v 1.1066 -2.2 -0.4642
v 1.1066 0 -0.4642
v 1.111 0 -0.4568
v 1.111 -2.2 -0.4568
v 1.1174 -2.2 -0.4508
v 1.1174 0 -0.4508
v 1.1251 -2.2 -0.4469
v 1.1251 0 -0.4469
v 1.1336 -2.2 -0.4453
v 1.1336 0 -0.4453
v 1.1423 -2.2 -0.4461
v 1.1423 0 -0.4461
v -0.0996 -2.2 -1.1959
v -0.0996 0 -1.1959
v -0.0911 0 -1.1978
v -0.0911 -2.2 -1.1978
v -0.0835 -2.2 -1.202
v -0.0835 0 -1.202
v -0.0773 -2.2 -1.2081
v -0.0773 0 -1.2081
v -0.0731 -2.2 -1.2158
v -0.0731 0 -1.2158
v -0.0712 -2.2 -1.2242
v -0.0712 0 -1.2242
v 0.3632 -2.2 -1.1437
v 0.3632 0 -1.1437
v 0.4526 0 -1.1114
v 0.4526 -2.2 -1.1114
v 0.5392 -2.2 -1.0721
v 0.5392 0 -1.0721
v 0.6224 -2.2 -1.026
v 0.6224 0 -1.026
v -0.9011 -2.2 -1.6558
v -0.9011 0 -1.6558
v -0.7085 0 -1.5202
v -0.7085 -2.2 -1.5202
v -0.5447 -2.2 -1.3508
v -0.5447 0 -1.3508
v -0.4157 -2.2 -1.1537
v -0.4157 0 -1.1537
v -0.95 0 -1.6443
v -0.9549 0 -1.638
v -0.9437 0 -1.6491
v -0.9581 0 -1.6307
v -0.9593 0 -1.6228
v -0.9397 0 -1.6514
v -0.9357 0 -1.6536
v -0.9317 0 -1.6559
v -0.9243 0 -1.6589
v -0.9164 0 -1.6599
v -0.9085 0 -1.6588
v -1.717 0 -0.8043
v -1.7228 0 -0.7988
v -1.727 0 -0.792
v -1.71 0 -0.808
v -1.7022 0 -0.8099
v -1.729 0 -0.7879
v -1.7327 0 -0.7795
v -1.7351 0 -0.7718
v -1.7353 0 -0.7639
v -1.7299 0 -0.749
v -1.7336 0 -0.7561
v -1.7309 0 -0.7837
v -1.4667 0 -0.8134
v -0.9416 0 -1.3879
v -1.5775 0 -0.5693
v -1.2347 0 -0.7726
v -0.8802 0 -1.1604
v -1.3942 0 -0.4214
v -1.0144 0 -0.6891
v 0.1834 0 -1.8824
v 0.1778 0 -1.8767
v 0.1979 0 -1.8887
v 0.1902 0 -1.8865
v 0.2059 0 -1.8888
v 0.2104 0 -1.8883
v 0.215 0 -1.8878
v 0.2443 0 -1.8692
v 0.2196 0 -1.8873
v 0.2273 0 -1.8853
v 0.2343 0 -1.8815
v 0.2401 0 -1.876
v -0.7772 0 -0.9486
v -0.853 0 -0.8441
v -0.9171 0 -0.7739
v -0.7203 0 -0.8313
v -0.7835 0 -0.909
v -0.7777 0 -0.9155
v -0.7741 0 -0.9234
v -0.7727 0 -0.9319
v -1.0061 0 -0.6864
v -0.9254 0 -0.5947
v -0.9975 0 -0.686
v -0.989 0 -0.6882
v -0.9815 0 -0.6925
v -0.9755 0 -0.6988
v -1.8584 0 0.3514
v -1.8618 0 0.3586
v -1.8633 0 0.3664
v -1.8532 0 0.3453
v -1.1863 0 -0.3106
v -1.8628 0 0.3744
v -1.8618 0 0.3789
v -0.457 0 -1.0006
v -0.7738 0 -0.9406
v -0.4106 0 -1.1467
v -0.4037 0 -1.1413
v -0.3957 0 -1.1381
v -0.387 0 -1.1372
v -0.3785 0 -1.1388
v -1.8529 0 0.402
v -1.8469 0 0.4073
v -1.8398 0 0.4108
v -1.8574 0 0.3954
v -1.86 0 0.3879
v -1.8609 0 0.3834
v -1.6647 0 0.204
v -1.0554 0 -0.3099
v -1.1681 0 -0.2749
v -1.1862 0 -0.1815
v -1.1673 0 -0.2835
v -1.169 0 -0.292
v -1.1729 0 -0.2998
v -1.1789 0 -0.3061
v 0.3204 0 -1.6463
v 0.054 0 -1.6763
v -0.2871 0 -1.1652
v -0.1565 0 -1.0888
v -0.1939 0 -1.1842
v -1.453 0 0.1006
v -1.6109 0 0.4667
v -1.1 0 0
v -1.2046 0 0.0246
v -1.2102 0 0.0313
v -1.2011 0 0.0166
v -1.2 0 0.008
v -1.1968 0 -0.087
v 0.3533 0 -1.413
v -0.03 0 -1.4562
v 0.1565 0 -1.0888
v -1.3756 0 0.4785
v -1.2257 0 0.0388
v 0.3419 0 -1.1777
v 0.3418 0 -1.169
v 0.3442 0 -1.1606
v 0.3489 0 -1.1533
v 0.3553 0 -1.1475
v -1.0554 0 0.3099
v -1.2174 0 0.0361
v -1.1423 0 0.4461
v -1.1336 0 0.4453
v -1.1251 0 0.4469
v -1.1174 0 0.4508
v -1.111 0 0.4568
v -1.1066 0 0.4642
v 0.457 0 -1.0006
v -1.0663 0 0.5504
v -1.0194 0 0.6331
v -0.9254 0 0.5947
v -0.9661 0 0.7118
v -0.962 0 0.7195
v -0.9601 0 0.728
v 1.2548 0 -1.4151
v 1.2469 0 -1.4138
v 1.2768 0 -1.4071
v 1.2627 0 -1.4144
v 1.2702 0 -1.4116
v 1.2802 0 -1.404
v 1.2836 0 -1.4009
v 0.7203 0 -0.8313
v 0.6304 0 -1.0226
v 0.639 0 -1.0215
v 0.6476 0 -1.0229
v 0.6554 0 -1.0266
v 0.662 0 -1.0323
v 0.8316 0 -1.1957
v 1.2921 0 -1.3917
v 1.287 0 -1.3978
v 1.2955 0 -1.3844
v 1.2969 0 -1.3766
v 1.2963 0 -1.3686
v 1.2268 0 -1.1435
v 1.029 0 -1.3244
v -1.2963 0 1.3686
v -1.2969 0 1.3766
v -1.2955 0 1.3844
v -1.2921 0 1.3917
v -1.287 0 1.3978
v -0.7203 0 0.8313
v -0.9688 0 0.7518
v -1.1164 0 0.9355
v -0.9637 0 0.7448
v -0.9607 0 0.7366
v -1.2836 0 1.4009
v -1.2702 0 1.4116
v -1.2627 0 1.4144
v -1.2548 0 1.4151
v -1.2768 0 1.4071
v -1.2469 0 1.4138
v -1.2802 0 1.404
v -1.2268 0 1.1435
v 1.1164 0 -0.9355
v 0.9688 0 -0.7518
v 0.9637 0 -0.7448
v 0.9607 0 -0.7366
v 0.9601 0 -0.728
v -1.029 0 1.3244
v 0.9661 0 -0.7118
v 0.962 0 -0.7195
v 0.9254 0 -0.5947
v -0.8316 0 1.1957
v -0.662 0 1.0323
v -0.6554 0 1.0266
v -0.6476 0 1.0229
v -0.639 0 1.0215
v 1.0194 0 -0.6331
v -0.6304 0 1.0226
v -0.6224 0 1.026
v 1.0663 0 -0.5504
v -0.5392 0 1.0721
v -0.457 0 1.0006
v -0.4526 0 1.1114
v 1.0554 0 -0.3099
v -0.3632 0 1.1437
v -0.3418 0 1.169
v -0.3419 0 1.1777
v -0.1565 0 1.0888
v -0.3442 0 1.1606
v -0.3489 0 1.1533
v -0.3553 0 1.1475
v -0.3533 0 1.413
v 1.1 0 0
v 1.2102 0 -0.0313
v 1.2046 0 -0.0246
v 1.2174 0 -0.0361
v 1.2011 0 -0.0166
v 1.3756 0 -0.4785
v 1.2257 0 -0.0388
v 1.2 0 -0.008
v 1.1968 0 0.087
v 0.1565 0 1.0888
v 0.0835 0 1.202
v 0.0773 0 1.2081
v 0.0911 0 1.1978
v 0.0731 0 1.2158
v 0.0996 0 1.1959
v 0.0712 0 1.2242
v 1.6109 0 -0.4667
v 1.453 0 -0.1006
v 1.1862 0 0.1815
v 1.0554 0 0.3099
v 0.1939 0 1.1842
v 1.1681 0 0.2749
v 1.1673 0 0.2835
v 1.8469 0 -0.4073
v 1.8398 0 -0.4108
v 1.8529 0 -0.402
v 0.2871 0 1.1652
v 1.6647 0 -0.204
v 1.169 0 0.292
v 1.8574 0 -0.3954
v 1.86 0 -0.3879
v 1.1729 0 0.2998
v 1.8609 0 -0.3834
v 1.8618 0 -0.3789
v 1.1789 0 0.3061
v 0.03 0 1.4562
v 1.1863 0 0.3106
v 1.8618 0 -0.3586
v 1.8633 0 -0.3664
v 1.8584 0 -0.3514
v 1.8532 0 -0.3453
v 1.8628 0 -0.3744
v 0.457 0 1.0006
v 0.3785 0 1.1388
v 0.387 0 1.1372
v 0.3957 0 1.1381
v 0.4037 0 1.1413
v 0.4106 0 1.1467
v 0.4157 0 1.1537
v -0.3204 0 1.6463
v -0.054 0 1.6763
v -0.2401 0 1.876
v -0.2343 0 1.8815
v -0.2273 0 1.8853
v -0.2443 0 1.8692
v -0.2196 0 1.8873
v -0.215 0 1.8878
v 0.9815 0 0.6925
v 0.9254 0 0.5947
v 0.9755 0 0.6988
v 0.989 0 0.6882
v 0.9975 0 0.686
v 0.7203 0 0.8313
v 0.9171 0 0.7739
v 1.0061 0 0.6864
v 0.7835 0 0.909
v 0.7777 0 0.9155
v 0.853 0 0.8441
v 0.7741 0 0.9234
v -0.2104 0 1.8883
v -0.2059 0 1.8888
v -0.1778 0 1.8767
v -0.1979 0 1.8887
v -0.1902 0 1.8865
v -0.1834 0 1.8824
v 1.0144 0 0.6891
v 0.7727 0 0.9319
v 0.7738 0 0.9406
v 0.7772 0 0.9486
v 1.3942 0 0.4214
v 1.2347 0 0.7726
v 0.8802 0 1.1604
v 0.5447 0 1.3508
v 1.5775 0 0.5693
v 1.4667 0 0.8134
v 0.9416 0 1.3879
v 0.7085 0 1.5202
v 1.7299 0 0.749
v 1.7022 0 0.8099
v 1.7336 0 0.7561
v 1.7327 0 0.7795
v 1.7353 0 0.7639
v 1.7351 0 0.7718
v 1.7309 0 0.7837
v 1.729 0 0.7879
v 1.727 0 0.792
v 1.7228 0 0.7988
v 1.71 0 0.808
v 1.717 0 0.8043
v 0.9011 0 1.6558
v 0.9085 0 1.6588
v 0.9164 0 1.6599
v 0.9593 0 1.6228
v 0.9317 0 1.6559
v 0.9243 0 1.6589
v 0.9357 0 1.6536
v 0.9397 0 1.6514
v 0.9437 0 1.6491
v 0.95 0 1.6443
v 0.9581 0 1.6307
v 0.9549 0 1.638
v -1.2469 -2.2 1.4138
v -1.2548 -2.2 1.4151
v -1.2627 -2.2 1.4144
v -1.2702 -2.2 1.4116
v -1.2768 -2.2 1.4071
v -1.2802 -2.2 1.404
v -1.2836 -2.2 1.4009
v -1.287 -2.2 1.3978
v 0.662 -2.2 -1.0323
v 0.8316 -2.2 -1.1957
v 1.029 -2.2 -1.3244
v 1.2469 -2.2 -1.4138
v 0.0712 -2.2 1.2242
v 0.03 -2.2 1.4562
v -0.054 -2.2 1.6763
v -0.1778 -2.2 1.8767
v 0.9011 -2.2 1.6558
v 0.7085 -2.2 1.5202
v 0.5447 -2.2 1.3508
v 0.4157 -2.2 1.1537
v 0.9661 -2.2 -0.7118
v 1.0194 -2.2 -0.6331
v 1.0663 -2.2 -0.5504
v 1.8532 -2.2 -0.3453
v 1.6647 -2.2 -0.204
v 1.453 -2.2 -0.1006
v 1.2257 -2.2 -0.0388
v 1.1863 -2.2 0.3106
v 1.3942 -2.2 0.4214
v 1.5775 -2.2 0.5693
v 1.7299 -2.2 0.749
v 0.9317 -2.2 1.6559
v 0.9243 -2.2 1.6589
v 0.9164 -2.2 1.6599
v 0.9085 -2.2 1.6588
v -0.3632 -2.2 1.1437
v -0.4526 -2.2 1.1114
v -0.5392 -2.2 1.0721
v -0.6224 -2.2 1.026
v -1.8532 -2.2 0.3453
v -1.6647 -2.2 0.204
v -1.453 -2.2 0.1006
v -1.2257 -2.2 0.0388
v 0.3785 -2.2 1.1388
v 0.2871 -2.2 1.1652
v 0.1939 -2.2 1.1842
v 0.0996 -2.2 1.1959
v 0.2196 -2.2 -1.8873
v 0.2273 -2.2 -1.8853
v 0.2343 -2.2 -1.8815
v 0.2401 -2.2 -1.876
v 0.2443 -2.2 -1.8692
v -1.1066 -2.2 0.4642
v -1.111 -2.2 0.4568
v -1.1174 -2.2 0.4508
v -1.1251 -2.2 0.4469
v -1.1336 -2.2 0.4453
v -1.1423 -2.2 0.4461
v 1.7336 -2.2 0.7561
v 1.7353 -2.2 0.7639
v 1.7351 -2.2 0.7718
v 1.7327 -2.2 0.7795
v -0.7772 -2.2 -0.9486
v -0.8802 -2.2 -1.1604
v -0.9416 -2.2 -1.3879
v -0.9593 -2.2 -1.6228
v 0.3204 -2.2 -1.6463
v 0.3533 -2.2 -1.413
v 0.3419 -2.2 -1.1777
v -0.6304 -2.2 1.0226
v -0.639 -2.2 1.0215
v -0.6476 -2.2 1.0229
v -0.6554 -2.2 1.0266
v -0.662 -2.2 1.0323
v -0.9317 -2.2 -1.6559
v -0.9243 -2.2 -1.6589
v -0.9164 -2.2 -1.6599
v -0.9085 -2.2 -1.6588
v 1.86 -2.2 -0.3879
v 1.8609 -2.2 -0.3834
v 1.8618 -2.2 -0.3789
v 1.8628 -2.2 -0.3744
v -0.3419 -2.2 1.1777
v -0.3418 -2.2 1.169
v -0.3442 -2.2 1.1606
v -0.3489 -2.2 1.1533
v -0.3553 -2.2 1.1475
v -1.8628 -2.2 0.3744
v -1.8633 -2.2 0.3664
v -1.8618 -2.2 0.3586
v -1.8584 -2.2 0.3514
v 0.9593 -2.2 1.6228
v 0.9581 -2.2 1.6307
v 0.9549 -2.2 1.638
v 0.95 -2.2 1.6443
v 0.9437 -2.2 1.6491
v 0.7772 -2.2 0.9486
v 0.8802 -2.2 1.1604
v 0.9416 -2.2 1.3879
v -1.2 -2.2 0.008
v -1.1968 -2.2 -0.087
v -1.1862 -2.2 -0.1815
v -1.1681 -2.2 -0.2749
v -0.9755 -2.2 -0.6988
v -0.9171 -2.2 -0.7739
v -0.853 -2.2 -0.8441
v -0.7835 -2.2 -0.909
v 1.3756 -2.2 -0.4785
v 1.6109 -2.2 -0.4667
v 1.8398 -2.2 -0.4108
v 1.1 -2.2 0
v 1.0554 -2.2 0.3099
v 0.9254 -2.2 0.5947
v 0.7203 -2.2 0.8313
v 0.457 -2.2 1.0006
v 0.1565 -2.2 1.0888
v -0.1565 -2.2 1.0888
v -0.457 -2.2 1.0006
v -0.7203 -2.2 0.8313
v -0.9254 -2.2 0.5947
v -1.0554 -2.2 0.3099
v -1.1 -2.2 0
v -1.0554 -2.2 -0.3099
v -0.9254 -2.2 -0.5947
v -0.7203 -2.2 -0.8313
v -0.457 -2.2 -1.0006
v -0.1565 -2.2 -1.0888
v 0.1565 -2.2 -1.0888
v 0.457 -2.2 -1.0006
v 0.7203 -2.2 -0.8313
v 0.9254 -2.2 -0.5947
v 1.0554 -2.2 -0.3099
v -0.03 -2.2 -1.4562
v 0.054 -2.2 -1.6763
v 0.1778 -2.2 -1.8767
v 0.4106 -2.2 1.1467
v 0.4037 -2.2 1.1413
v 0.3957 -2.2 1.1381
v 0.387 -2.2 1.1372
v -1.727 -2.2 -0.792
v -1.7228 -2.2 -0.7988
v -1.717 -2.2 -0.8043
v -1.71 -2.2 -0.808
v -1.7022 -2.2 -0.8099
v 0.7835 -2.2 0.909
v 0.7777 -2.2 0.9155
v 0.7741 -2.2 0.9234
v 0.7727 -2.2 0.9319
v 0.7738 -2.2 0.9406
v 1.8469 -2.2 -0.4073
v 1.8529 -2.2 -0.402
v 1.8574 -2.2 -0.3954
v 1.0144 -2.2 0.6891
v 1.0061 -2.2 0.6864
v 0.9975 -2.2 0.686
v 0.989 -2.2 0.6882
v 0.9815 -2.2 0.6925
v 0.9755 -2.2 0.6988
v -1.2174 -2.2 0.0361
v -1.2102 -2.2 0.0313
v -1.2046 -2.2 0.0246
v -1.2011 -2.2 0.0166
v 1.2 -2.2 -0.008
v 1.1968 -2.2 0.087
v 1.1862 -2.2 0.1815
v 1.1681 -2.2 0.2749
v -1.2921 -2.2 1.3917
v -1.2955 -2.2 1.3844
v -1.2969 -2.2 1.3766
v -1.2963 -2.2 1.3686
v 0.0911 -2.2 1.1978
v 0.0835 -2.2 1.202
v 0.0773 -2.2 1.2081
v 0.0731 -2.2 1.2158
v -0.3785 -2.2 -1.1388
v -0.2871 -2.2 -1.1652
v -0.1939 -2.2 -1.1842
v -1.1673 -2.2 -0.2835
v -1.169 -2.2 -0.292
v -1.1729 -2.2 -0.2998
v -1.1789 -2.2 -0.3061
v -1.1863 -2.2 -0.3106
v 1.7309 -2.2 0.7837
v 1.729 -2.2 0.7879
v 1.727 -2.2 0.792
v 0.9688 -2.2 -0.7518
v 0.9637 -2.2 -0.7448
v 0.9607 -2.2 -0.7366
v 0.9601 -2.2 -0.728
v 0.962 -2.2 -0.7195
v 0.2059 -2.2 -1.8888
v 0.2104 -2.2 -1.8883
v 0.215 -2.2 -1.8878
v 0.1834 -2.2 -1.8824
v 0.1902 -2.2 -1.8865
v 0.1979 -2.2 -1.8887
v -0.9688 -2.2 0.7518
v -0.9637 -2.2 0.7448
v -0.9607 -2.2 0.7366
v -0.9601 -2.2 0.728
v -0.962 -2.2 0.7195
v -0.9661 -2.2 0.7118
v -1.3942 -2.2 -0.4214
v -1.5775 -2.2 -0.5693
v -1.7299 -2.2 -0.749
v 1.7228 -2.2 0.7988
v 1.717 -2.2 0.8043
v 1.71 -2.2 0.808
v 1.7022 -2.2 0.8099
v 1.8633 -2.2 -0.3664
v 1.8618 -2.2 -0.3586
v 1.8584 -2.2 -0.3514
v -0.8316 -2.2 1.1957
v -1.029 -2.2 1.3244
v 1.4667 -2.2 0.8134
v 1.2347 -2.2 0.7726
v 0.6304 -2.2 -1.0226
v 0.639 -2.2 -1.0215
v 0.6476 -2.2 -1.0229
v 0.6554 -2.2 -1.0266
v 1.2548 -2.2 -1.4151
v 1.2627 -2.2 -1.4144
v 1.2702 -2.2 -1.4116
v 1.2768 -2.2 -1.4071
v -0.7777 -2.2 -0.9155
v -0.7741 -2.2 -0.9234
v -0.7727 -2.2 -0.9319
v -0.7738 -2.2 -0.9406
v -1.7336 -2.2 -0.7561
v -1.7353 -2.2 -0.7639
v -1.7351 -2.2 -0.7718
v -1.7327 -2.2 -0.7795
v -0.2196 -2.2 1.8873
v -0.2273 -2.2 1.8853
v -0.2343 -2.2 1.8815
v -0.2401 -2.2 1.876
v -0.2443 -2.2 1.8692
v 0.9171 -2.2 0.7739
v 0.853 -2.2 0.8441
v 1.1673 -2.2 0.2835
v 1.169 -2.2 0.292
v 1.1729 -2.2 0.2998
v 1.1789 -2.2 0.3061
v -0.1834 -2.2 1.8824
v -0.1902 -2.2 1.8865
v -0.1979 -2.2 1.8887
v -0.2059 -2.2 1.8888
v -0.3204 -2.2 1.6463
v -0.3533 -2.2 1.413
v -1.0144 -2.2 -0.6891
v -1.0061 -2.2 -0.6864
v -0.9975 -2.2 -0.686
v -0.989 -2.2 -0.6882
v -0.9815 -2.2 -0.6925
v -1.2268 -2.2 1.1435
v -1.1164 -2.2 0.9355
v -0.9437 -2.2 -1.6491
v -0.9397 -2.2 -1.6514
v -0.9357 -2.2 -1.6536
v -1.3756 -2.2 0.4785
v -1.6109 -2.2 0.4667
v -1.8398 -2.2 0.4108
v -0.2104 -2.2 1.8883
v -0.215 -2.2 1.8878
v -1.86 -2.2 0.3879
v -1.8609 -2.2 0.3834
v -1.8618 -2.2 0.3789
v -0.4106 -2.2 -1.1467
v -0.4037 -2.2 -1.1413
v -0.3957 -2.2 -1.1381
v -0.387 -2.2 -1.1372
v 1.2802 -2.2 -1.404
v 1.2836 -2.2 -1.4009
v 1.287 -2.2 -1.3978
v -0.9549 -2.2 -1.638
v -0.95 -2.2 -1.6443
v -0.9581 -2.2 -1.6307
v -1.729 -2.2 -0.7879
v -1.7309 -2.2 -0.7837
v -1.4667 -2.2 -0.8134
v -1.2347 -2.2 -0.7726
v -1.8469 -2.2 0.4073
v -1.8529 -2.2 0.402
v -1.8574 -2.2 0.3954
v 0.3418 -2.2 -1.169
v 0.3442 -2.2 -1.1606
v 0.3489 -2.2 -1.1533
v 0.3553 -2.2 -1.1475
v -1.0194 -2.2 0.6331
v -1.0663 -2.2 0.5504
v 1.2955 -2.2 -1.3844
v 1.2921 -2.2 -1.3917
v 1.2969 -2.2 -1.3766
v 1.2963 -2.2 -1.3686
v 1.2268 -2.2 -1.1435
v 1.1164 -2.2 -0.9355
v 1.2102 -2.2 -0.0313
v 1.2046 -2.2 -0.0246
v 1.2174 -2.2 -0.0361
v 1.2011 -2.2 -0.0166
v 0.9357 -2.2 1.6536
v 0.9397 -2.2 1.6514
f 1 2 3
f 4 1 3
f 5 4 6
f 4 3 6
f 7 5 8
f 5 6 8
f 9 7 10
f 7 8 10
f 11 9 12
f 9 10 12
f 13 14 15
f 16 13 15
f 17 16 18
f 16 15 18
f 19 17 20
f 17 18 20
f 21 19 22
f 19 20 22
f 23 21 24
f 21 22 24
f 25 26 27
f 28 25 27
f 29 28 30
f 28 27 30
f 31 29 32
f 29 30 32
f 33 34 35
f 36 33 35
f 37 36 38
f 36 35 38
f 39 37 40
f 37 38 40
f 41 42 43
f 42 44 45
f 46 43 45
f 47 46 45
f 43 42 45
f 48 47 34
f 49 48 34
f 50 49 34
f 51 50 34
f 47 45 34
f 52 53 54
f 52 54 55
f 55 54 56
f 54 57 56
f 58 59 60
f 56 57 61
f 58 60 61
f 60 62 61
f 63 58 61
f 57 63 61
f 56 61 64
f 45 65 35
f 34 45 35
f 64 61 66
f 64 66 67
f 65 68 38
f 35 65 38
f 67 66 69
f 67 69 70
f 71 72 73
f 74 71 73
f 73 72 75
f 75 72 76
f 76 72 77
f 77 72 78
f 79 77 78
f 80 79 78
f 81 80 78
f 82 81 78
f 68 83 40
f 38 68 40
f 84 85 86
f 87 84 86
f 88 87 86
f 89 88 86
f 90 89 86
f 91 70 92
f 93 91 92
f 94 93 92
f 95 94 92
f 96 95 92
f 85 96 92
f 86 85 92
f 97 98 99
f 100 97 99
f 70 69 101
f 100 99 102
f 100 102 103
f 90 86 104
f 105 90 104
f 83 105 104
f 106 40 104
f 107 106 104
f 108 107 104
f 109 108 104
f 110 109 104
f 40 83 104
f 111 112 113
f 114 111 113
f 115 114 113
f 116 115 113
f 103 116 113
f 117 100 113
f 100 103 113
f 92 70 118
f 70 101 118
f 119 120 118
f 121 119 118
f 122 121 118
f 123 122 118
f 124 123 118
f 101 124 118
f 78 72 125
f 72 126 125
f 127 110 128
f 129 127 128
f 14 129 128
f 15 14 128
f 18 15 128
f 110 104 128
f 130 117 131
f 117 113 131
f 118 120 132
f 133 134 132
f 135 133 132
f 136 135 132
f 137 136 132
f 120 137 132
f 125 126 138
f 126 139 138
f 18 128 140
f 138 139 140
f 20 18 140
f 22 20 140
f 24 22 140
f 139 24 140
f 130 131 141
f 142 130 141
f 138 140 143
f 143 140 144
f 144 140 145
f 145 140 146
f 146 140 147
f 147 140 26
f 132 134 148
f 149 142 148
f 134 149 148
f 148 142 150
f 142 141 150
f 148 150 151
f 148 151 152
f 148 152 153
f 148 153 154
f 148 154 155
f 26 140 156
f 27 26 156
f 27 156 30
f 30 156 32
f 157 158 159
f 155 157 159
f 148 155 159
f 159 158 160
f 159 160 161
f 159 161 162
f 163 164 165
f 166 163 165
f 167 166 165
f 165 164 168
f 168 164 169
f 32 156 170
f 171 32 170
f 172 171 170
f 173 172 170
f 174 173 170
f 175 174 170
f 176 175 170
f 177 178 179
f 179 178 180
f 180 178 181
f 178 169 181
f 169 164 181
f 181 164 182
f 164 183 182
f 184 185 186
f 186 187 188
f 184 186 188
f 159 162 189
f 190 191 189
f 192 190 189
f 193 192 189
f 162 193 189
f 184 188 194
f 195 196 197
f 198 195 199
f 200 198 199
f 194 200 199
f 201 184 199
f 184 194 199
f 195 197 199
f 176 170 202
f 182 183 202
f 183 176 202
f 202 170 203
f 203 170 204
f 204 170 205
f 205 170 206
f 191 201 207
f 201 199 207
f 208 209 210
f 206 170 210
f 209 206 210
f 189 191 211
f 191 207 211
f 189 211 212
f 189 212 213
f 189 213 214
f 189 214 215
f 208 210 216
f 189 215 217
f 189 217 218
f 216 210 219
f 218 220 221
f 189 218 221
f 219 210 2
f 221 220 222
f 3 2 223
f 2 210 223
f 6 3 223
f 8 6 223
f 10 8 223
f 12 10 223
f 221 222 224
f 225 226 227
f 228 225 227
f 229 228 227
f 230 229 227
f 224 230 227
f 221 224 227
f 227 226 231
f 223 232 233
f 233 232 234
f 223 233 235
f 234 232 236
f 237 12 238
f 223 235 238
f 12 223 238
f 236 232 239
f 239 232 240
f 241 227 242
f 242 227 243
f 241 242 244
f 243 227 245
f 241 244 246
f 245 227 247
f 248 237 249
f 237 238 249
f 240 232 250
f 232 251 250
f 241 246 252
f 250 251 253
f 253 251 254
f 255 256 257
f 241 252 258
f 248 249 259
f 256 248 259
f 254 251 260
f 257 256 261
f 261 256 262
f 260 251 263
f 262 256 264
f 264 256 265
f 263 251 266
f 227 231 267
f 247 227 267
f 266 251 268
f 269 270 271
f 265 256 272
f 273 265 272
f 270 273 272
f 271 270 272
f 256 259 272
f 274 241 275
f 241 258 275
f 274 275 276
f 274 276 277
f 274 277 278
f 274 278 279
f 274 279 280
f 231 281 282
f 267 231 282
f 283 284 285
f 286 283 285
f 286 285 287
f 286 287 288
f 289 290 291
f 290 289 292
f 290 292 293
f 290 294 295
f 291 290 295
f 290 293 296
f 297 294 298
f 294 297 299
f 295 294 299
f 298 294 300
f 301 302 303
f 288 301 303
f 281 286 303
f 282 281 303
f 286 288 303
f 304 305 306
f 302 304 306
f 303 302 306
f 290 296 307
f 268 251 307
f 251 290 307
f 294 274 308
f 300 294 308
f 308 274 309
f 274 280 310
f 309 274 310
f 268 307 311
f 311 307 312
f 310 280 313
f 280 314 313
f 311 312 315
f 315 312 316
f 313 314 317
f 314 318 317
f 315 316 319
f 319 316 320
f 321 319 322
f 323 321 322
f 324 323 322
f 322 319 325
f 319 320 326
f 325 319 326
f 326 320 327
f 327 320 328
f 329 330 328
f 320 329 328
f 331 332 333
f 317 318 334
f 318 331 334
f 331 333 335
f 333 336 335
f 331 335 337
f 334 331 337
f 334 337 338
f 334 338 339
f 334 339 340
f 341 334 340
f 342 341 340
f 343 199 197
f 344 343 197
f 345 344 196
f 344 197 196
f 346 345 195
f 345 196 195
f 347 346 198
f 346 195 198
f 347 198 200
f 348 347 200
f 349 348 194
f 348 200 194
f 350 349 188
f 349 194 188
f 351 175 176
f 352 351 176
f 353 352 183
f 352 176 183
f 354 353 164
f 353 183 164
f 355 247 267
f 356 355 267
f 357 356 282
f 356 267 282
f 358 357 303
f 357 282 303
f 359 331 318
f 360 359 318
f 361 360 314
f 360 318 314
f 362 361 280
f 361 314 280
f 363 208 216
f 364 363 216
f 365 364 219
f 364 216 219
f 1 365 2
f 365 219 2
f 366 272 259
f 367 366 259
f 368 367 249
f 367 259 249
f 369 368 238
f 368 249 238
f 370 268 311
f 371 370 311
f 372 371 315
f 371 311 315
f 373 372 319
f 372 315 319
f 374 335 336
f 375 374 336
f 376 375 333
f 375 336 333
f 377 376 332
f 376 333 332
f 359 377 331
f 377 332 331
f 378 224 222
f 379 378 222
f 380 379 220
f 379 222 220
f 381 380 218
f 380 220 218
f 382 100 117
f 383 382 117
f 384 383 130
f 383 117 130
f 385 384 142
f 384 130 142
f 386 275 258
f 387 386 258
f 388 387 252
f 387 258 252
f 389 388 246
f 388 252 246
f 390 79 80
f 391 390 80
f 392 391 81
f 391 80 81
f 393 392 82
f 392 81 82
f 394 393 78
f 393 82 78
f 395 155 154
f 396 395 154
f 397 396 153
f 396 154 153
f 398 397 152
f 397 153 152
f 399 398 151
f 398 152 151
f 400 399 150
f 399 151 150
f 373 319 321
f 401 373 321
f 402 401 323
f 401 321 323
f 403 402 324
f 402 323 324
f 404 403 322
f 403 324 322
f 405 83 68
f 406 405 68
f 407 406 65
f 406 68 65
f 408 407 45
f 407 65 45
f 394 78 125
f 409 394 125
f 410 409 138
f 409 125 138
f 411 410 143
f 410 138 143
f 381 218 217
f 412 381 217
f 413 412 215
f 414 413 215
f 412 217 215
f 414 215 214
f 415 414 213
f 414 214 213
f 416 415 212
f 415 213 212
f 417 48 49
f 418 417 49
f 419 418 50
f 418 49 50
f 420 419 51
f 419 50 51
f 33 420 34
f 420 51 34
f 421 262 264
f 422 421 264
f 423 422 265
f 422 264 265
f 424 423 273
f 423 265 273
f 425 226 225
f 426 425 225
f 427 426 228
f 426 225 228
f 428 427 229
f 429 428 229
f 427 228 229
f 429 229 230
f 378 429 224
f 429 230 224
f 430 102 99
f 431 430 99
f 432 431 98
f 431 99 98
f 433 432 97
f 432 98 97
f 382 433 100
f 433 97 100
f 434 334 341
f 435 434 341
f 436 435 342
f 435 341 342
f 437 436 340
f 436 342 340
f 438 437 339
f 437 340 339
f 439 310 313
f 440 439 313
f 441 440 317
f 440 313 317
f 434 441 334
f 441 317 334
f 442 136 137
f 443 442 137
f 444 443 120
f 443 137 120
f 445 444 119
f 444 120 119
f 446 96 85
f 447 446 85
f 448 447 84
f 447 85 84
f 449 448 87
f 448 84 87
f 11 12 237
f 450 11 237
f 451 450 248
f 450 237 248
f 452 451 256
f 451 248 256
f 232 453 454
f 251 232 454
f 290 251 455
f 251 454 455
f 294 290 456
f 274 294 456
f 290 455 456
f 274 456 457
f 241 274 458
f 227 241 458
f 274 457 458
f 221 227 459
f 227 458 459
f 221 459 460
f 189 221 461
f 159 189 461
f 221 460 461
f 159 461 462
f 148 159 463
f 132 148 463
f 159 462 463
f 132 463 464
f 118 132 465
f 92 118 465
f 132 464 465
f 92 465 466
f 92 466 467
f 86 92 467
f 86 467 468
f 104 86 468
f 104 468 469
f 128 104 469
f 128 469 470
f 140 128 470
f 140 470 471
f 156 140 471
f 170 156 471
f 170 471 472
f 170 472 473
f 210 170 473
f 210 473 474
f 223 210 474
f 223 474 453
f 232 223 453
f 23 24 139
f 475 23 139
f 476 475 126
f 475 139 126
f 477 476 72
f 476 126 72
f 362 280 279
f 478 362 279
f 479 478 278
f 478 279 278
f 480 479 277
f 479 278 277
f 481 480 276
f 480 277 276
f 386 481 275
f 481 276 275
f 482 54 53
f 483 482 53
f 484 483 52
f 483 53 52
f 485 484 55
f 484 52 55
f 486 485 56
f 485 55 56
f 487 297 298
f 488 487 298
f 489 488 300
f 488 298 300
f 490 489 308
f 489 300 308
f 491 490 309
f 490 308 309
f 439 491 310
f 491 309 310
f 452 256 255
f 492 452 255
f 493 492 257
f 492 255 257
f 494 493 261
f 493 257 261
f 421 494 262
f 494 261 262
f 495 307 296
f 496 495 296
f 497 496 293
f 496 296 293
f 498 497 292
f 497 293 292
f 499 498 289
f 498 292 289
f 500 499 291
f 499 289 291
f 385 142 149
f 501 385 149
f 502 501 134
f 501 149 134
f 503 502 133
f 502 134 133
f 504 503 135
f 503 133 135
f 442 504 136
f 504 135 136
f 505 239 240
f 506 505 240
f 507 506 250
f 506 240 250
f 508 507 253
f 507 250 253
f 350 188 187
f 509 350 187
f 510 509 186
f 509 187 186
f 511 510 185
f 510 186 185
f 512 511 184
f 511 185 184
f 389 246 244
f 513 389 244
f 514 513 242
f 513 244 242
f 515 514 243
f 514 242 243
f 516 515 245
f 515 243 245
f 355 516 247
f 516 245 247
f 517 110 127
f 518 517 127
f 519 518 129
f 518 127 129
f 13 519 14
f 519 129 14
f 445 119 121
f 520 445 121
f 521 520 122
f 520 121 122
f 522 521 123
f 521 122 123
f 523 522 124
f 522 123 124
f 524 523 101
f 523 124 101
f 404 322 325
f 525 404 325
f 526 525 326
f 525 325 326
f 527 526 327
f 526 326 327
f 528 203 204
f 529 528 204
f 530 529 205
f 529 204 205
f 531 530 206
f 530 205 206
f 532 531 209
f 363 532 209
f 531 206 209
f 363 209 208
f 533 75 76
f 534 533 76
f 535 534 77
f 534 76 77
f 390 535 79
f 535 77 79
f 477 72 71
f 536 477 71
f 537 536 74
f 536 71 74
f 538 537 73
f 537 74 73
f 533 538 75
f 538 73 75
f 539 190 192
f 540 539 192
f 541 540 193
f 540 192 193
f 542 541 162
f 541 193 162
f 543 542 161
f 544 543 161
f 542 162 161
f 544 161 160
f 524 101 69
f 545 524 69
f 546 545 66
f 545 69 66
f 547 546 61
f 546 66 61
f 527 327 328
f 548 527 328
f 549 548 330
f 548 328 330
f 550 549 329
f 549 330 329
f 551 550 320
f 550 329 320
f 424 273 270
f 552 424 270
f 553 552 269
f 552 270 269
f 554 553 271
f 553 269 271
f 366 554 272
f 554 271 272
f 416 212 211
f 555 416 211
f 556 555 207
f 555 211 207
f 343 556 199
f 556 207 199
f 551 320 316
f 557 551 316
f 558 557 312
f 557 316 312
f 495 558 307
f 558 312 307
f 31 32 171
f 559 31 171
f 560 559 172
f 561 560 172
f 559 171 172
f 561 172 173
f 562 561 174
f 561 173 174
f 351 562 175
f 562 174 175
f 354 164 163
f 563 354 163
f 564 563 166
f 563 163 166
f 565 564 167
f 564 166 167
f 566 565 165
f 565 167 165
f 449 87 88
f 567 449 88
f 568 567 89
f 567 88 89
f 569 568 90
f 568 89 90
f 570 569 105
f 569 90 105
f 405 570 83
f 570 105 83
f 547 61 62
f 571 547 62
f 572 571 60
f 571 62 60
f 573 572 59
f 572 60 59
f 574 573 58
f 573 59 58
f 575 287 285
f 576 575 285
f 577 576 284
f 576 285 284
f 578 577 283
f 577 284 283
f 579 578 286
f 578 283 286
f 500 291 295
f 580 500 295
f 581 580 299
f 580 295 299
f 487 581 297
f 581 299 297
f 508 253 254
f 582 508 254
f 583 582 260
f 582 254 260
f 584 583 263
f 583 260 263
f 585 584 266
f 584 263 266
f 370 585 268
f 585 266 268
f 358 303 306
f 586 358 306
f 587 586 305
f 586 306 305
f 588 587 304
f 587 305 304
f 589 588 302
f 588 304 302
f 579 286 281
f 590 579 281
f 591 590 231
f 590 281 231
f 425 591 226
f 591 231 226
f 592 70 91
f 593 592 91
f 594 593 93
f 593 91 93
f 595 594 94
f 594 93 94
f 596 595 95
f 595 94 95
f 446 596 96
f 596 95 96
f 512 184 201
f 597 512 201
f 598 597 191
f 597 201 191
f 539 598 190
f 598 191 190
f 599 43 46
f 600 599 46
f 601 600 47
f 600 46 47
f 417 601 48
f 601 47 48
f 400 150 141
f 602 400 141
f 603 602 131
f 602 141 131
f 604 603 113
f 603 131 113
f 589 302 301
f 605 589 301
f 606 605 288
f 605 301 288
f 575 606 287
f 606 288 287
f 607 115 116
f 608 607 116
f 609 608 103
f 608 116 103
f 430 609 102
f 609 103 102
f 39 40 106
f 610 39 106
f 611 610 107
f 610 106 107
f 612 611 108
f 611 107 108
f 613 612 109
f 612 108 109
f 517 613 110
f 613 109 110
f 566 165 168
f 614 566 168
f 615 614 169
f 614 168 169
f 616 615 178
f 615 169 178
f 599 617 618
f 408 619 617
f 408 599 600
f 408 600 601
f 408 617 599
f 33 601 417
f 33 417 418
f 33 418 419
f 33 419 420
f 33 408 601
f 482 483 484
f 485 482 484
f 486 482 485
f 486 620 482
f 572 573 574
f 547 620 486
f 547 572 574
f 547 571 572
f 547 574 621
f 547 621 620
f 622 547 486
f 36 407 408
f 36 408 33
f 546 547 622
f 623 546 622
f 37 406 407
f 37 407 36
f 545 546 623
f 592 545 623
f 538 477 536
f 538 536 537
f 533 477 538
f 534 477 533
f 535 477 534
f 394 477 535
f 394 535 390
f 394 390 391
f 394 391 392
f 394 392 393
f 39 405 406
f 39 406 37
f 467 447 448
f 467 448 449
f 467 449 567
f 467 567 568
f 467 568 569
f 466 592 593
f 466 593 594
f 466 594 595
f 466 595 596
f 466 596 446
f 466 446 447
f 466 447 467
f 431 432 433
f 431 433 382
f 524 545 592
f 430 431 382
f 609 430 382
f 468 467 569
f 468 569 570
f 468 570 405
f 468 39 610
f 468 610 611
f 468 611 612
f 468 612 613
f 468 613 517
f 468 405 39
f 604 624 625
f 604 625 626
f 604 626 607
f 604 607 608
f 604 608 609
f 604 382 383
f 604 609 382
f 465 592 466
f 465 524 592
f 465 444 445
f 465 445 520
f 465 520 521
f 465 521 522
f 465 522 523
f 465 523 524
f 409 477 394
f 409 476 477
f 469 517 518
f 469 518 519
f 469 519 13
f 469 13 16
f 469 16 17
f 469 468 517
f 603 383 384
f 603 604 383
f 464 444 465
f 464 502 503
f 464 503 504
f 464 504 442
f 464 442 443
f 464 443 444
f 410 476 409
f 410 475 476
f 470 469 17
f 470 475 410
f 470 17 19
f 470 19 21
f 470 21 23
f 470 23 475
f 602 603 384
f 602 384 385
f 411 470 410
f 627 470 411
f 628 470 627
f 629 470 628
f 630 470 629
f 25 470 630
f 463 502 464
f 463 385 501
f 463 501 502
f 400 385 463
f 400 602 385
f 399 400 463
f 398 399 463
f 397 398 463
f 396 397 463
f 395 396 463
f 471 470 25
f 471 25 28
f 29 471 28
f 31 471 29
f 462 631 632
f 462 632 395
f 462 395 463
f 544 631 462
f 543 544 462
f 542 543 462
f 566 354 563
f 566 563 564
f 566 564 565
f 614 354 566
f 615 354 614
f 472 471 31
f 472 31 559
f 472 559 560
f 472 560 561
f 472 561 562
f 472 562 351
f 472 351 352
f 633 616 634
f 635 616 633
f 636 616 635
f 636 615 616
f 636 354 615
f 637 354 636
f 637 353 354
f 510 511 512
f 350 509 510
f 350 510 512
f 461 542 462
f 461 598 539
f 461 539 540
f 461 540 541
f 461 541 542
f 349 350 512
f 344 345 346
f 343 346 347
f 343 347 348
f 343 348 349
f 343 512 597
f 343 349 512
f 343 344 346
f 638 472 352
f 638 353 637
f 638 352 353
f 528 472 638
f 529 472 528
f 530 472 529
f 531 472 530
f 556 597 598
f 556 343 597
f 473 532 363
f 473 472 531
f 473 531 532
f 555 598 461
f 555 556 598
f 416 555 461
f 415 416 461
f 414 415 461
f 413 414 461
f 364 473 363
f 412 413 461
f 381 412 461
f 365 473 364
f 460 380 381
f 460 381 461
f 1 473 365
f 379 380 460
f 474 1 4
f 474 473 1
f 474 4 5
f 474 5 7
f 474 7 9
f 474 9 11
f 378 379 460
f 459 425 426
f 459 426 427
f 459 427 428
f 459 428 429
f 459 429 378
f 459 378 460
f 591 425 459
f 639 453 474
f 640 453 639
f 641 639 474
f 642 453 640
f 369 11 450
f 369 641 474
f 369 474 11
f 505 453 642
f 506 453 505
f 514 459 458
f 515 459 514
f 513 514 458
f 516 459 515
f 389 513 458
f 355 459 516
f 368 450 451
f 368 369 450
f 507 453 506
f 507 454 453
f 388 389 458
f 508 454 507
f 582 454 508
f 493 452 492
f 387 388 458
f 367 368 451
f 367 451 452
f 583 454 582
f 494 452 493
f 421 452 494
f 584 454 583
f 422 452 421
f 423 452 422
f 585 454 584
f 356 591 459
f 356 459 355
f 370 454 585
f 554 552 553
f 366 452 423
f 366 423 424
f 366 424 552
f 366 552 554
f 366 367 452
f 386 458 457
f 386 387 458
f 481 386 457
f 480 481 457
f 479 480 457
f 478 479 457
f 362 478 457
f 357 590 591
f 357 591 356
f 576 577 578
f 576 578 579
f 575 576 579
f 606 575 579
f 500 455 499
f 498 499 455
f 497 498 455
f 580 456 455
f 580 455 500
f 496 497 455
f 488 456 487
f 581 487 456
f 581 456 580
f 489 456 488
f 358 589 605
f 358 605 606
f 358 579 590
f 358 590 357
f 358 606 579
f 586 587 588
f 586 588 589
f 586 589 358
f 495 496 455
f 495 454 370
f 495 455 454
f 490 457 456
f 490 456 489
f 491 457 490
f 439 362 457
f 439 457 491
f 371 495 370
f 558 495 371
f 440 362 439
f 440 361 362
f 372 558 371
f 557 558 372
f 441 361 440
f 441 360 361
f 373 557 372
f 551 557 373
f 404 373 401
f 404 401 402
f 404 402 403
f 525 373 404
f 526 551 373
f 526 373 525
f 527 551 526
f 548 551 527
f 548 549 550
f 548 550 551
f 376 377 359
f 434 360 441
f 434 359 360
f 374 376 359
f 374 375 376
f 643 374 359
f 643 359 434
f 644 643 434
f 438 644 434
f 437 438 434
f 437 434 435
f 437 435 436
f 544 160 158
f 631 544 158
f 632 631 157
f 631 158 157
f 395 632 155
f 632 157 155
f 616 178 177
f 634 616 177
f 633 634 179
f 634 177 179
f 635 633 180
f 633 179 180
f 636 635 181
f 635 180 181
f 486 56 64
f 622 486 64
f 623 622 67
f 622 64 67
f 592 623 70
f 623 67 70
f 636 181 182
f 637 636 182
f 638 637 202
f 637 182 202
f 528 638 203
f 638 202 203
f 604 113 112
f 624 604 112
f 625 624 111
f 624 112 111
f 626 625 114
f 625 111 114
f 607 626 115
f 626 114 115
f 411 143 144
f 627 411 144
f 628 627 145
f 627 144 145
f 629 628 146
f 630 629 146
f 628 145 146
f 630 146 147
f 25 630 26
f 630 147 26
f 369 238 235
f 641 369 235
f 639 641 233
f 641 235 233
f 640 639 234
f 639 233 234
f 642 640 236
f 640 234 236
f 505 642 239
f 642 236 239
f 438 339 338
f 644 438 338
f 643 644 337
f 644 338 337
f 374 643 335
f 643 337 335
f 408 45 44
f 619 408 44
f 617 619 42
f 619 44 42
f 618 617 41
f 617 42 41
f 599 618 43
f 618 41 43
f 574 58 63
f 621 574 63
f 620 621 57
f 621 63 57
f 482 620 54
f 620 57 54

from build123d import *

# Parameters (mm, degrees)
F1_DEPTH = 2.2
F2_R     = 1.1
F3_DEPTH = 2.201


# Not quite as in the source:
# - a feature names something its author has since deleted; it is built from what else it names


with BuildPart() as f1:
    # F0 (on Front) → F1 (new body)
    with BuildSketch(Plane.XZ):
        with BuildLine():
            ThreePointArc((0.0712355079, 1.2242322703), (-0.0067892224, 1.5682114478), (-0.1777987566, 1.8767001385))
            ThreePointArc((-0.1777987566, 1.8767001385), (-0.1902412648, 1.886460015), (-0.2058788954, 1.888812823))
            ThreePointArc((-0.2058788954, 1.888812823), (-0.2127325046, 1.8880531988), (-0.2195833118, 1.8872687061))
            ThreePointArc((-0.2195833118, 1.8872687061), (-0.2343053253, 1.8814951877), (-0.244264097, 1.8692112932))
            ThreePointArc((-0.244264097, 1.8692112932), (-0.3423408736, 1.5304038568), (-0.3418667931, 1.1776868196))
            ThreePointArc((-0.3418667931, 1.1776868196), (-0.3462894397, 1.1567994489), (-0.3631689361, 1.1437256331))
            ThreePointArc((-0.3631689361, 1.1437256331), (-0.496270206, 1.092573056), (-0.6223642321, 1.025993549))
            ThreePointArc((-0.6223642321, 1.025993549), (-0.8096046551, 0.885742797), (-0.966074901, 0.7118281293))
            ThreePointArc((-0.966074901, 0.7118281293), (-1.0436893598, 0.5922098617), (-1.1065671175, 0.4642297001))
            ThreePointArc((-1.1065671175, 0.4642297001), (-1.1756104781, 0.2407072989), (-1.1999730893, 0.0080364743))
            ThreePointArc((-1.1999730893, 0.0080364743), (-1.1924546519, -0.1343573713), (-1.1680989749, -0.2748541157))
            ThreePointArc((-1.1680989749, -0.2748541157), (-1.092573056, -0.496270206), (-0.9755223431, -0.6988248408))
            ThreePointArc((-0.9755223431, -0.6988248408), (-0.885742797, -0.8096046551), (-0.7834567261, -0.9089530012))
            ThreePointArc((-0.7834567261, -0.9089530012), (-0.5922098617, -1.0436893598), (-0.3784552187, -1.1387588188))
            ThreePointArc((-0.3784552187, -1.1387588188), (-0.2407072989, -1.1756104781), (-0.0995606366, -1.1958627344))
            ThreePointArc((-0.0995606366, -1.1958627344), (0.1343573713, -1.1924546519), (0.3631689361, -1.1437256331))
            ThreePointArc((0.3631689361, -1.1437256331), (0.496270206, -1.092573056), (0.6223642321, -1.025993549))
            ThreePointArc((0.6223642321, -1.025993549), (0.8096046551, -0.885742797), (0.966074901, -0.7118281293))
            ThreePointArc((0.966074901, -0.7118281293), (1.0436893598, -0.5922098617), (1.1065671175, -0.4642297001))
            ThreePointArc((1.1065671175, -0.4642297001), (1.1756104781, -0.2407072989), (1.1999730893, -0.0080364743))
            ThreePointArc((1.1999730893, -0.0080364743), (1.1924546519, 0.1343573713), (1.1680989749, 0.2748541157))
            ThreePointArc((1.1680989749, 0.2748541157), (1.092573056, 0.496270206), (0.9755223431, 0.6988248408))
            ThreePointArc((0.9755223431, 0.6988248408), (0.885742797, 0.8096046551), (0.7834567261, 0.9089530012))
            ThreePointArc((0.7834567261, 0.9089530012), (0.5922098617, 1.0436893598), (0.3784552187, 1.1387588188))
            ThreePointArc((0.3784552187, 1.1387588188), (0.2407072989, 1.1756104781), (0.0995606366, 1.1958627344))
            ThreePointArc((0.0995606366, 1.1958627344), (0.0801951467, 1.2048527211), (0.0712355079, 1.2242322703))
        make_face()
        with BuildLine():
            ThreePointArc((-0.966074901, 0.7118281293), (-0.8096046551, 0.885742797), (-0.6223642321, 1.025993549))
            ThreePointArc((-0.6223642321, 1.025993549), (-0.6433154241, 1.0218838516), (-0.6619549374, 1.0322958927))
            ThreePointArc((-0.6619549374, 1.0322958927), (-0.9272641578, 1.2647191073), (-1.2469388801, 1.4137748184))
            ThreePointArc((-1.2469388801, 1.4137748184), (-1.262741792, 1.4143572015), (-1.2767758469, 1.4070690946))
            ThreePointArc((-1.2767758469, 1.4070690946), (-1.2818740373, 1.4024260952), (-1.2869553435, 1.3977646239))
            ThreePointArc((-1.2869553435, 1.3977646239), (-1.2954721137, 1.3844403669), (-1.2963086372, 1.3686488684))
            ThreePointArc((-1.2963086372, 1.3686488684), (-1.1765084017, 1.0368998116), (-0.9688029898, 0.7518243919))
            ThreePointArc((-0.9688029898, 0.7518243919), (-0.9601036976, 0.7323265875), (-0.966074901, 0.7118281293))
        make_face()
        with BuildLine():
            ThreePointArc((-0.9755223431, -0.6988248408), (-1.092573056, -0.496270206), (-1.1680989749, -0.2748541157))
            ThreePointArc((-1.1680989749, -0.2748541157), (-1.1706646948, -0.2960498497), (-1.1863270607, -0.3105595826))
            ThreePointArc((-1.1863270607, -0.3105595826), (-1.4893597313, -0.4910609223), (-1.7299050585, -0.7490289022))
            ThreePointArc((-1.7299050585, -0.7490289022), (-1.7353423061, -0.7638783983), (-1.7327476659, -0.7794777265))
            ThreePointArc((-1.7327476659, -0.7794777265), (-1.7299073387, -0.7857611594), (-1.7270442259, -0.7920342427))
            ThreePointArc((-1.7270442259, -0.7920342427), (-1.7170039312, -0.8042515943), (-1.7022438237, -0.8099270169))
            ThreePointArc((-1.7022438237, -0.8099270169), (-1.3497114128, -0.7985063187), (-1.0144040751, -0.6890598826))
            ThreePointArc((-1.0144040751, -0.6890598826), (-0.9931723321, -0.686811517), (-0.9755223431, -0.6988248408))
        make_face()
        with BuildLine():
            ThreePointArc((0.3418667931, -1.1776868196), (0.3462894397, -1.1567994489), (0.3631689361, -1.1437256331))
            ThreePointArc((0.3631689361, -1.1437256331), (0.1343573713, -1.1924546519), (-0.0995606366, -1.1958627344))
            ThreePointArc((-0.0995606366, -1.1958627344), (-0.0801951467, -1.2048527211), (-0.0712355079, -1.2242322703))
            ThreePointArc((-0.0712355079, -1.2242322703), (0.0067892224, -1.5682114478), (0.1777987566, -1.8767001385))
            ThreePointArc((0.1777987566, -1.8767001385), (0.1902412648, -1.886460015), (0.2058788954, -1.888812823))
            ThreePointArc((0.2058788954, -1.888812823), (0.2127325046, -1.8880531988), (0.2195833118, -1.8872687061))
            ThreePointArc((0.2195833118, -1.8872687061), (0.2343053253, -1.8814951877), (0.244264097, -1.8692112932))
            ThreePointArc((0.244264097, -1.8692112932), (0.3423408736, -1.5304038568), (0.3418667931, -1.1776868196))
        make_face()
        with BuildLine():
            ThreePointArc((0.9688029898, -0.7518243919), (0.9601036976, -0.7323265875), (0.966074901, -0.7118281293))
            ThreePointArc((0.966074901, -0.7118281293), (0.8096046551, -0.885742797), (0.6223642321, -1.025993549))
            ThreePointArc((0.6223642321, -1.025993549), (0.6433154241, -1.0218838516), (0.6619549374, -1.0322958927))
            ThreePointArc((0.6619549374, -1.0322958927), (0.9272641578, -1.2647191073), (1.2469388801, -1.4137748184))
            ThreePointArc((1.2469388801, -1.4137748184), (1.262741792, -1.4143572015), (1.2767758469, -1.4070690946))
            ThreePointArc((1.2767758469, -1.4070690946), (1.2818740373, -1.4024260952), (1.2869553435, -1.3977646239))
            ThreePointArc((1.2869553435, -1.3977646239), (1.2954721137, -1.3844403669), (1.2963086372, -1.3686488684))
            ThreePointArc((1.2963086372, -1.3686488684), (1.1765084017, -1.0368998116), (0.9688029898, -0.7518243919))
        make_face()
        with BuildLine():
            ThreePointArc((1.2256893728, -0.0387906), (1.2071909758, -0.0281298606), (1.1999730893, -0.0080364743))
            ThreePointArc((1.1999730893, -0.0080364743), (1.1756104781, -0.2407072989), (1.1065671175, -0.4642297001))
            ThreePointArc((1.1065671175, -0.4642297001), (1.1211013684, -0.4485900834), (1.1423010956, -0.4460575705))
            ThreePointArc((1.1423010956, -0.4460575705), (1.4935557015, -0.478147054), (1.8397907332, -0.4108355701))
            ThreePointArc((1.8397907332, -0.4108355701), (1.8529178738, -0.4020180093), (1.8599878209, -0.3878727965))
            ThreePointArc((1.8599878209, -0.3878727965), (1.861383257, -0.38111989), (1.862754176, -0.3743619636))
            ThreePointArc((1.862754176, -0.3743619636), (1.861812586, -0.3585763814), (1.8532073379, -0.3453090945))
            ThreePointArc((1.8532073379, -0.3453090945), (1.5612897084, -0.1473352813), (1.2256893728, -0.0387906))
        make_face()
        with BuildLine():
            ThreePointArc((1.0144040751, 0.6890598826), (0.9931723321, 0.686811517), (0.9755223431, 0.6988248408))
            ThreePointArc((0.9755223431, 0.6988248408), (1.092573056, 0.496270206), (1.1680989749, 0.2748541157))
            ThreePointArc((1.1680989749, 0.2748541157), (1.1706646948, 0.2960498497), (1.1863270607, 0.3105595826))
            ThreePointArc((1.1863270607, 0.3105595826), (1.4893597313, 0.4910609223), (1.7299050585, 0.7490289022))
            ThreePointArc((1.7299050585, 0.7490289022), (1.7353423061, 0.7638783983), (1.7327476659, 0.7794777265))
            ThreePointArc((1.7327476659, 0.7794777265), (1.7299073387, 0.7857611594), (1.7270442259, 0.7920342427))
            ThreePointArc((1.7270442259, 0.7920342427), (1.7170039312, 0.8042515943), (1.7022438237, 0.8099270169))
            ThreePointArc((1.7022438237, 0.8099270169), (1.3497114128, 0.7985063187), (1.0144040751, 0.6890598826))
        make_face()
        with BuildLine():
            ThreePointArc((0.4156508989, 1.1537129104), (0.3997956142, 1.139414239), (0.3784552187, 1.1387588188))
            ThreePointArc((0.3784552187, 1.1387588188), (0.5922098617, 1.0436893598), (0.7834567261, 0.9089530012))
            ThreePointArc((0.7834567261, 0.9089530012), (0.7730738972, 0.9276088025), (0.7772164104, 0.9485535308))
            ThreePointArc((0.7772164104, 0.9485535308), (0.9162789653, 1.2727003169), (0.9592544487, 1.6227897924))
            ThreePointArc((0.9592544487, 1.6227897924), (0.9549249596, 1.6379992211), (0.9436567966, 1.6490942515))
            ThreePointArc((0.9436567966, 1.6490942515), (0.9376656143, 1.652508153), (0.9316620816, 1.6559002886))
            ThreePointArc((0.9316620816, 1.6559002886), (0.9163581335, 1.6598827965), (0.901081026, 1.6557985362))
            ThreePointArc((0.901081026, 1.6557985362), (0.6225892324, 1.4393456452), (0.4156508989, 1.1537129104))
        make_face()
        with BuildLine():
            ThreePointArc((-1.1999730893, 0.0080364743), (-1.1756104781, 0.2407072989), (-1.1065671175, 0.4642297001))
            ThreePointArc((-1.1065671175, 0.4642297001), (-1.1211013684, 0.4485900834), (-1.1423010956, 0.4460575705))
            ThreePointArc((-1.1423010956, 0.4460575705), (-1.4935557015, 0.478147054), (-1.8397907332, 0.4108355701))
            ThreePointArc((-1.8397907332, 0.4108355701), (-1.8529178738, 0.4020180093), (-1.8599878209, 0.3878727965))
            ThreePointArc((-1.8599878209, 0.3878727965), (-1.861383257, 0.38111989), (-1.862754176, 0.3743619636))
            ThreePointArc((-1.862754176, 0.3743619636), (-1.861812586, 0.3585763814), (-1.8532073379, 0.3453090945))
            ThreePointArc((-1.8532073379, 0.3453090945), (-1.5612897084, 0.1473352813), (-1.2256893728, 0.0387906))
            ThreePointArc((-1.2256893728, 0.0387906), (-1.2071909758, 0.0281298606), (-1.1999730893, 0.0080364743))
        make_face()
        with BuildLine():
            ThreePointArc((-0.3784552187, -1.1387588188), (-0.5922098617, -1.0436893598), (-0.7834567261, -0.9089530012))
            ThreePointArc((-0.7834567261, -0.9089530012), (-0.7730738972, -0.9276088025), (-0.7772164104, -0.9485535308))
            ThreePointArc((-0.7772164104, -0.9485535308), (-0.9162789653, -1.2727003169), (-0.9592544487, -1.6227897924))
            ThreePointArc((-0.9592544487, -1.6227897924), (-0.9549249596, -1.6379992211), (-0.9436567966, -1.6490942515))
            ThreePointArc((-0.9436567966, -1.6490942515), (-0.9376656143, -1.652508153), (-0.9316620816, -1.6559002886))
            ThreePointArc((-0.9316620816, -1.6559002886), (-0.9163581335, -1.6598827965), (-0.901081026, -1.6557985362))
            ThreePointArc((-0.901081026, -1.6557985362), (-0.6225892324, -1.4393456452), (-0.4156508989, -1.1537129104))
            ThreePointArc((-0.4156508989, -1.1537129104), (-0.3997956142, -1.139414239), (-0.3784552187, -1.1387588188))
        make_face()
    extrude(amount=F1_DEPTH)

    # F2 (on face) → F3 (cut, through all)
    with BuildSketch(Plane.XZ.offset(2.2)):
        Circle(F2_R)
    extrude(amount=-F3_DEPTH, mode=Mode.SUBTRACT)


solid = f1.part
